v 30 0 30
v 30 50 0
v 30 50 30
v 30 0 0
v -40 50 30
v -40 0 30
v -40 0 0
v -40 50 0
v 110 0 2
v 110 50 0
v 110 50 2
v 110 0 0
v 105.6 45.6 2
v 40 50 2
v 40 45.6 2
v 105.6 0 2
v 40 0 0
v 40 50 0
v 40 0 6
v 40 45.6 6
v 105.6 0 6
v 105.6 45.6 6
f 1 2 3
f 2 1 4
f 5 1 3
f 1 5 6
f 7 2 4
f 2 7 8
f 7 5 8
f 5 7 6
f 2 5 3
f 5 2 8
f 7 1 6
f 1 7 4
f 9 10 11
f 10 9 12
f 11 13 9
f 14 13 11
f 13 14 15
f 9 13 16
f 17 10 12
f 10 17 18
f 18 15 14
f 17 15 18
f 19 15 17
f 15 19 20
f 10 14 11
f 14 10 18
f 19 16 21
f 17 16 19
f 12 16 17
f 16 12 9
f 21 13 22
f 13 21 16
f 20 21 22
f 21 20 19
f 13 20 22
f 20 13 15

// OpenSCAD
// Two-part electronics enclosure: Box and Lid printed side-by-side.
// Part 1: Box (70x50x30 mm, 2mm walls, 2mm floor, open top).
// Part 2: Lid (70x50x2 mm plate with 4mm tall lip, 65.6x45.6 mm outer lip size).
// Orientation: Box on left, Lid on right, 10 mm gap between them.
// Both rest on Z=0.

// --- Dimensions ---
// Box dimensions (Outer X, Outer Y, Outer Z)
box_X = 70;
box_Y = 50;
box_Z = 30;

// Wall and floor thickness
wall_t = 2;
floor_t = 2;

// Lid dimensions
lid_plate_t = 2;
lip_h = 4;
lip_w = 1.5; // Lip wall thickness
lip_outer_X = 65.6;
lip_outer_Y = 45.6;

// Clearance
clearance = 0.2;

// Layout
gap = 10;

// --- Derived Dimensions ---
// Internal box dimensions
box_in_X = box_X - 2 * wall_t;
box_in_Y = box_Y - 2 * wall_t;
box_in_Z = box_Z - floor_t;

// Lip inner dimensions (to fit inside box with clearance)
// The lip outer size is given. The lip wall thickness is given.
// Lip inner X = Lip outer X - 2 * Lip wall thickness
lip_in_X = lip_outer_X - 2 * lip_w;
lip_in_Y = lip_outer_Y - 2 * lip_w;

// Check fit: Lip inner must be smaller than Box inner by at least clearance*2
// Lip inner X = 65.6 - 3 = 62.6. Box inner X = 70 - 4 = 66.
// Diff = 3.4 mm. Clearance required = 0.4 mm total (0.2 each side). OK.

$fn = 64;

// --- Part 1: The Box ---
// Position: Centred in Y, Left side of origin.
// Box sits on Z=0.
box_x_pos = -((box_X + gap) / 2);
box_y_pos = 0;
box_z_pos = 0;

module box() {
    translate([box_x_pos, box_y_pos, box_z_pos]) {
        // Main block (solid)
        // Outer size: box_X x box_Y x box_Z
        // We build a solid block and subtract the top opening and the internal air volume.
        
        // 1. Solid block
        translate([0, 0, 0]) cube([box_X, box_Y, box_Z]);
        
        // 2. Subtract the internal air volume (the empty space inside)
        // Inner dimensions: box_in_X x box_in_Y x (box_Z - floor_t)
        // The hole goes from floor_t to box_Z
        translate([wall_t, wall_t, floor_t]) 
            cube([box_in_X, box_in_Y, box_Z - floor_t]);
        
        // 3. Subtract the top opening (to make it open)
        // The opening is the same size as the internal air volume at the top
        translate([wall_t, wall_t, box_Z - floor_t]) 
            cube([box_in_X, box_in_Y, floor_t]);
    }
}

// --- Part 2: The Lid ---
// Position: Right side of origin, separated by gap.
// Lid sits on Z=0.
lid_x_pos = box_x_pos + box_X + gap;
lid_y_pos = 0;
lid_z_pos = 0;

module lid() {
    translate([lid_x_pos, lid_y_pos, lid_z_pos]) {
        // The lid consists of a base plate and a lip.
        // Base plate: 70 x 50 x 2 mm.
        // Lip: Rectangular wall on top of the plate.
        // Lip outer size: 65.6 x 45.6 mm.
        // Lip height: 4 mm.
        // Lip wall thickness: 1.5 mm.
        // The lip is centred on the plate.
        
        // 1. Base Plate
        translate([0, 0, 0]) cube([box_X, box_Y, lid_plate_t]);
        
        // 2. Lip
        // We build the lip as a hollow rectangular prism sitting on the plate.
        // Outer dimensions of the lip block: lip_outer_X x lip_outer_Y x lip_h
        // Inner hole of the lip: lip_in_X x lip_in_Y x lip_h
        
        // Outer block of the lip
        translate([0, 0, lid_plate_t]) 
            cube([lip_outer_X, lip_outer_Y, lip_h]);
        
        // Inner hole of the lip (subtract)
        // The hole goes from lid_plate_t to lid_plate_t + lip_h
        translate([lip_w, lip_w, lid_plate_t]) 
            cube([lip_in_X, lip_in_Y, lip_h]);
    }
}

// Render both parts
box();
lid();
